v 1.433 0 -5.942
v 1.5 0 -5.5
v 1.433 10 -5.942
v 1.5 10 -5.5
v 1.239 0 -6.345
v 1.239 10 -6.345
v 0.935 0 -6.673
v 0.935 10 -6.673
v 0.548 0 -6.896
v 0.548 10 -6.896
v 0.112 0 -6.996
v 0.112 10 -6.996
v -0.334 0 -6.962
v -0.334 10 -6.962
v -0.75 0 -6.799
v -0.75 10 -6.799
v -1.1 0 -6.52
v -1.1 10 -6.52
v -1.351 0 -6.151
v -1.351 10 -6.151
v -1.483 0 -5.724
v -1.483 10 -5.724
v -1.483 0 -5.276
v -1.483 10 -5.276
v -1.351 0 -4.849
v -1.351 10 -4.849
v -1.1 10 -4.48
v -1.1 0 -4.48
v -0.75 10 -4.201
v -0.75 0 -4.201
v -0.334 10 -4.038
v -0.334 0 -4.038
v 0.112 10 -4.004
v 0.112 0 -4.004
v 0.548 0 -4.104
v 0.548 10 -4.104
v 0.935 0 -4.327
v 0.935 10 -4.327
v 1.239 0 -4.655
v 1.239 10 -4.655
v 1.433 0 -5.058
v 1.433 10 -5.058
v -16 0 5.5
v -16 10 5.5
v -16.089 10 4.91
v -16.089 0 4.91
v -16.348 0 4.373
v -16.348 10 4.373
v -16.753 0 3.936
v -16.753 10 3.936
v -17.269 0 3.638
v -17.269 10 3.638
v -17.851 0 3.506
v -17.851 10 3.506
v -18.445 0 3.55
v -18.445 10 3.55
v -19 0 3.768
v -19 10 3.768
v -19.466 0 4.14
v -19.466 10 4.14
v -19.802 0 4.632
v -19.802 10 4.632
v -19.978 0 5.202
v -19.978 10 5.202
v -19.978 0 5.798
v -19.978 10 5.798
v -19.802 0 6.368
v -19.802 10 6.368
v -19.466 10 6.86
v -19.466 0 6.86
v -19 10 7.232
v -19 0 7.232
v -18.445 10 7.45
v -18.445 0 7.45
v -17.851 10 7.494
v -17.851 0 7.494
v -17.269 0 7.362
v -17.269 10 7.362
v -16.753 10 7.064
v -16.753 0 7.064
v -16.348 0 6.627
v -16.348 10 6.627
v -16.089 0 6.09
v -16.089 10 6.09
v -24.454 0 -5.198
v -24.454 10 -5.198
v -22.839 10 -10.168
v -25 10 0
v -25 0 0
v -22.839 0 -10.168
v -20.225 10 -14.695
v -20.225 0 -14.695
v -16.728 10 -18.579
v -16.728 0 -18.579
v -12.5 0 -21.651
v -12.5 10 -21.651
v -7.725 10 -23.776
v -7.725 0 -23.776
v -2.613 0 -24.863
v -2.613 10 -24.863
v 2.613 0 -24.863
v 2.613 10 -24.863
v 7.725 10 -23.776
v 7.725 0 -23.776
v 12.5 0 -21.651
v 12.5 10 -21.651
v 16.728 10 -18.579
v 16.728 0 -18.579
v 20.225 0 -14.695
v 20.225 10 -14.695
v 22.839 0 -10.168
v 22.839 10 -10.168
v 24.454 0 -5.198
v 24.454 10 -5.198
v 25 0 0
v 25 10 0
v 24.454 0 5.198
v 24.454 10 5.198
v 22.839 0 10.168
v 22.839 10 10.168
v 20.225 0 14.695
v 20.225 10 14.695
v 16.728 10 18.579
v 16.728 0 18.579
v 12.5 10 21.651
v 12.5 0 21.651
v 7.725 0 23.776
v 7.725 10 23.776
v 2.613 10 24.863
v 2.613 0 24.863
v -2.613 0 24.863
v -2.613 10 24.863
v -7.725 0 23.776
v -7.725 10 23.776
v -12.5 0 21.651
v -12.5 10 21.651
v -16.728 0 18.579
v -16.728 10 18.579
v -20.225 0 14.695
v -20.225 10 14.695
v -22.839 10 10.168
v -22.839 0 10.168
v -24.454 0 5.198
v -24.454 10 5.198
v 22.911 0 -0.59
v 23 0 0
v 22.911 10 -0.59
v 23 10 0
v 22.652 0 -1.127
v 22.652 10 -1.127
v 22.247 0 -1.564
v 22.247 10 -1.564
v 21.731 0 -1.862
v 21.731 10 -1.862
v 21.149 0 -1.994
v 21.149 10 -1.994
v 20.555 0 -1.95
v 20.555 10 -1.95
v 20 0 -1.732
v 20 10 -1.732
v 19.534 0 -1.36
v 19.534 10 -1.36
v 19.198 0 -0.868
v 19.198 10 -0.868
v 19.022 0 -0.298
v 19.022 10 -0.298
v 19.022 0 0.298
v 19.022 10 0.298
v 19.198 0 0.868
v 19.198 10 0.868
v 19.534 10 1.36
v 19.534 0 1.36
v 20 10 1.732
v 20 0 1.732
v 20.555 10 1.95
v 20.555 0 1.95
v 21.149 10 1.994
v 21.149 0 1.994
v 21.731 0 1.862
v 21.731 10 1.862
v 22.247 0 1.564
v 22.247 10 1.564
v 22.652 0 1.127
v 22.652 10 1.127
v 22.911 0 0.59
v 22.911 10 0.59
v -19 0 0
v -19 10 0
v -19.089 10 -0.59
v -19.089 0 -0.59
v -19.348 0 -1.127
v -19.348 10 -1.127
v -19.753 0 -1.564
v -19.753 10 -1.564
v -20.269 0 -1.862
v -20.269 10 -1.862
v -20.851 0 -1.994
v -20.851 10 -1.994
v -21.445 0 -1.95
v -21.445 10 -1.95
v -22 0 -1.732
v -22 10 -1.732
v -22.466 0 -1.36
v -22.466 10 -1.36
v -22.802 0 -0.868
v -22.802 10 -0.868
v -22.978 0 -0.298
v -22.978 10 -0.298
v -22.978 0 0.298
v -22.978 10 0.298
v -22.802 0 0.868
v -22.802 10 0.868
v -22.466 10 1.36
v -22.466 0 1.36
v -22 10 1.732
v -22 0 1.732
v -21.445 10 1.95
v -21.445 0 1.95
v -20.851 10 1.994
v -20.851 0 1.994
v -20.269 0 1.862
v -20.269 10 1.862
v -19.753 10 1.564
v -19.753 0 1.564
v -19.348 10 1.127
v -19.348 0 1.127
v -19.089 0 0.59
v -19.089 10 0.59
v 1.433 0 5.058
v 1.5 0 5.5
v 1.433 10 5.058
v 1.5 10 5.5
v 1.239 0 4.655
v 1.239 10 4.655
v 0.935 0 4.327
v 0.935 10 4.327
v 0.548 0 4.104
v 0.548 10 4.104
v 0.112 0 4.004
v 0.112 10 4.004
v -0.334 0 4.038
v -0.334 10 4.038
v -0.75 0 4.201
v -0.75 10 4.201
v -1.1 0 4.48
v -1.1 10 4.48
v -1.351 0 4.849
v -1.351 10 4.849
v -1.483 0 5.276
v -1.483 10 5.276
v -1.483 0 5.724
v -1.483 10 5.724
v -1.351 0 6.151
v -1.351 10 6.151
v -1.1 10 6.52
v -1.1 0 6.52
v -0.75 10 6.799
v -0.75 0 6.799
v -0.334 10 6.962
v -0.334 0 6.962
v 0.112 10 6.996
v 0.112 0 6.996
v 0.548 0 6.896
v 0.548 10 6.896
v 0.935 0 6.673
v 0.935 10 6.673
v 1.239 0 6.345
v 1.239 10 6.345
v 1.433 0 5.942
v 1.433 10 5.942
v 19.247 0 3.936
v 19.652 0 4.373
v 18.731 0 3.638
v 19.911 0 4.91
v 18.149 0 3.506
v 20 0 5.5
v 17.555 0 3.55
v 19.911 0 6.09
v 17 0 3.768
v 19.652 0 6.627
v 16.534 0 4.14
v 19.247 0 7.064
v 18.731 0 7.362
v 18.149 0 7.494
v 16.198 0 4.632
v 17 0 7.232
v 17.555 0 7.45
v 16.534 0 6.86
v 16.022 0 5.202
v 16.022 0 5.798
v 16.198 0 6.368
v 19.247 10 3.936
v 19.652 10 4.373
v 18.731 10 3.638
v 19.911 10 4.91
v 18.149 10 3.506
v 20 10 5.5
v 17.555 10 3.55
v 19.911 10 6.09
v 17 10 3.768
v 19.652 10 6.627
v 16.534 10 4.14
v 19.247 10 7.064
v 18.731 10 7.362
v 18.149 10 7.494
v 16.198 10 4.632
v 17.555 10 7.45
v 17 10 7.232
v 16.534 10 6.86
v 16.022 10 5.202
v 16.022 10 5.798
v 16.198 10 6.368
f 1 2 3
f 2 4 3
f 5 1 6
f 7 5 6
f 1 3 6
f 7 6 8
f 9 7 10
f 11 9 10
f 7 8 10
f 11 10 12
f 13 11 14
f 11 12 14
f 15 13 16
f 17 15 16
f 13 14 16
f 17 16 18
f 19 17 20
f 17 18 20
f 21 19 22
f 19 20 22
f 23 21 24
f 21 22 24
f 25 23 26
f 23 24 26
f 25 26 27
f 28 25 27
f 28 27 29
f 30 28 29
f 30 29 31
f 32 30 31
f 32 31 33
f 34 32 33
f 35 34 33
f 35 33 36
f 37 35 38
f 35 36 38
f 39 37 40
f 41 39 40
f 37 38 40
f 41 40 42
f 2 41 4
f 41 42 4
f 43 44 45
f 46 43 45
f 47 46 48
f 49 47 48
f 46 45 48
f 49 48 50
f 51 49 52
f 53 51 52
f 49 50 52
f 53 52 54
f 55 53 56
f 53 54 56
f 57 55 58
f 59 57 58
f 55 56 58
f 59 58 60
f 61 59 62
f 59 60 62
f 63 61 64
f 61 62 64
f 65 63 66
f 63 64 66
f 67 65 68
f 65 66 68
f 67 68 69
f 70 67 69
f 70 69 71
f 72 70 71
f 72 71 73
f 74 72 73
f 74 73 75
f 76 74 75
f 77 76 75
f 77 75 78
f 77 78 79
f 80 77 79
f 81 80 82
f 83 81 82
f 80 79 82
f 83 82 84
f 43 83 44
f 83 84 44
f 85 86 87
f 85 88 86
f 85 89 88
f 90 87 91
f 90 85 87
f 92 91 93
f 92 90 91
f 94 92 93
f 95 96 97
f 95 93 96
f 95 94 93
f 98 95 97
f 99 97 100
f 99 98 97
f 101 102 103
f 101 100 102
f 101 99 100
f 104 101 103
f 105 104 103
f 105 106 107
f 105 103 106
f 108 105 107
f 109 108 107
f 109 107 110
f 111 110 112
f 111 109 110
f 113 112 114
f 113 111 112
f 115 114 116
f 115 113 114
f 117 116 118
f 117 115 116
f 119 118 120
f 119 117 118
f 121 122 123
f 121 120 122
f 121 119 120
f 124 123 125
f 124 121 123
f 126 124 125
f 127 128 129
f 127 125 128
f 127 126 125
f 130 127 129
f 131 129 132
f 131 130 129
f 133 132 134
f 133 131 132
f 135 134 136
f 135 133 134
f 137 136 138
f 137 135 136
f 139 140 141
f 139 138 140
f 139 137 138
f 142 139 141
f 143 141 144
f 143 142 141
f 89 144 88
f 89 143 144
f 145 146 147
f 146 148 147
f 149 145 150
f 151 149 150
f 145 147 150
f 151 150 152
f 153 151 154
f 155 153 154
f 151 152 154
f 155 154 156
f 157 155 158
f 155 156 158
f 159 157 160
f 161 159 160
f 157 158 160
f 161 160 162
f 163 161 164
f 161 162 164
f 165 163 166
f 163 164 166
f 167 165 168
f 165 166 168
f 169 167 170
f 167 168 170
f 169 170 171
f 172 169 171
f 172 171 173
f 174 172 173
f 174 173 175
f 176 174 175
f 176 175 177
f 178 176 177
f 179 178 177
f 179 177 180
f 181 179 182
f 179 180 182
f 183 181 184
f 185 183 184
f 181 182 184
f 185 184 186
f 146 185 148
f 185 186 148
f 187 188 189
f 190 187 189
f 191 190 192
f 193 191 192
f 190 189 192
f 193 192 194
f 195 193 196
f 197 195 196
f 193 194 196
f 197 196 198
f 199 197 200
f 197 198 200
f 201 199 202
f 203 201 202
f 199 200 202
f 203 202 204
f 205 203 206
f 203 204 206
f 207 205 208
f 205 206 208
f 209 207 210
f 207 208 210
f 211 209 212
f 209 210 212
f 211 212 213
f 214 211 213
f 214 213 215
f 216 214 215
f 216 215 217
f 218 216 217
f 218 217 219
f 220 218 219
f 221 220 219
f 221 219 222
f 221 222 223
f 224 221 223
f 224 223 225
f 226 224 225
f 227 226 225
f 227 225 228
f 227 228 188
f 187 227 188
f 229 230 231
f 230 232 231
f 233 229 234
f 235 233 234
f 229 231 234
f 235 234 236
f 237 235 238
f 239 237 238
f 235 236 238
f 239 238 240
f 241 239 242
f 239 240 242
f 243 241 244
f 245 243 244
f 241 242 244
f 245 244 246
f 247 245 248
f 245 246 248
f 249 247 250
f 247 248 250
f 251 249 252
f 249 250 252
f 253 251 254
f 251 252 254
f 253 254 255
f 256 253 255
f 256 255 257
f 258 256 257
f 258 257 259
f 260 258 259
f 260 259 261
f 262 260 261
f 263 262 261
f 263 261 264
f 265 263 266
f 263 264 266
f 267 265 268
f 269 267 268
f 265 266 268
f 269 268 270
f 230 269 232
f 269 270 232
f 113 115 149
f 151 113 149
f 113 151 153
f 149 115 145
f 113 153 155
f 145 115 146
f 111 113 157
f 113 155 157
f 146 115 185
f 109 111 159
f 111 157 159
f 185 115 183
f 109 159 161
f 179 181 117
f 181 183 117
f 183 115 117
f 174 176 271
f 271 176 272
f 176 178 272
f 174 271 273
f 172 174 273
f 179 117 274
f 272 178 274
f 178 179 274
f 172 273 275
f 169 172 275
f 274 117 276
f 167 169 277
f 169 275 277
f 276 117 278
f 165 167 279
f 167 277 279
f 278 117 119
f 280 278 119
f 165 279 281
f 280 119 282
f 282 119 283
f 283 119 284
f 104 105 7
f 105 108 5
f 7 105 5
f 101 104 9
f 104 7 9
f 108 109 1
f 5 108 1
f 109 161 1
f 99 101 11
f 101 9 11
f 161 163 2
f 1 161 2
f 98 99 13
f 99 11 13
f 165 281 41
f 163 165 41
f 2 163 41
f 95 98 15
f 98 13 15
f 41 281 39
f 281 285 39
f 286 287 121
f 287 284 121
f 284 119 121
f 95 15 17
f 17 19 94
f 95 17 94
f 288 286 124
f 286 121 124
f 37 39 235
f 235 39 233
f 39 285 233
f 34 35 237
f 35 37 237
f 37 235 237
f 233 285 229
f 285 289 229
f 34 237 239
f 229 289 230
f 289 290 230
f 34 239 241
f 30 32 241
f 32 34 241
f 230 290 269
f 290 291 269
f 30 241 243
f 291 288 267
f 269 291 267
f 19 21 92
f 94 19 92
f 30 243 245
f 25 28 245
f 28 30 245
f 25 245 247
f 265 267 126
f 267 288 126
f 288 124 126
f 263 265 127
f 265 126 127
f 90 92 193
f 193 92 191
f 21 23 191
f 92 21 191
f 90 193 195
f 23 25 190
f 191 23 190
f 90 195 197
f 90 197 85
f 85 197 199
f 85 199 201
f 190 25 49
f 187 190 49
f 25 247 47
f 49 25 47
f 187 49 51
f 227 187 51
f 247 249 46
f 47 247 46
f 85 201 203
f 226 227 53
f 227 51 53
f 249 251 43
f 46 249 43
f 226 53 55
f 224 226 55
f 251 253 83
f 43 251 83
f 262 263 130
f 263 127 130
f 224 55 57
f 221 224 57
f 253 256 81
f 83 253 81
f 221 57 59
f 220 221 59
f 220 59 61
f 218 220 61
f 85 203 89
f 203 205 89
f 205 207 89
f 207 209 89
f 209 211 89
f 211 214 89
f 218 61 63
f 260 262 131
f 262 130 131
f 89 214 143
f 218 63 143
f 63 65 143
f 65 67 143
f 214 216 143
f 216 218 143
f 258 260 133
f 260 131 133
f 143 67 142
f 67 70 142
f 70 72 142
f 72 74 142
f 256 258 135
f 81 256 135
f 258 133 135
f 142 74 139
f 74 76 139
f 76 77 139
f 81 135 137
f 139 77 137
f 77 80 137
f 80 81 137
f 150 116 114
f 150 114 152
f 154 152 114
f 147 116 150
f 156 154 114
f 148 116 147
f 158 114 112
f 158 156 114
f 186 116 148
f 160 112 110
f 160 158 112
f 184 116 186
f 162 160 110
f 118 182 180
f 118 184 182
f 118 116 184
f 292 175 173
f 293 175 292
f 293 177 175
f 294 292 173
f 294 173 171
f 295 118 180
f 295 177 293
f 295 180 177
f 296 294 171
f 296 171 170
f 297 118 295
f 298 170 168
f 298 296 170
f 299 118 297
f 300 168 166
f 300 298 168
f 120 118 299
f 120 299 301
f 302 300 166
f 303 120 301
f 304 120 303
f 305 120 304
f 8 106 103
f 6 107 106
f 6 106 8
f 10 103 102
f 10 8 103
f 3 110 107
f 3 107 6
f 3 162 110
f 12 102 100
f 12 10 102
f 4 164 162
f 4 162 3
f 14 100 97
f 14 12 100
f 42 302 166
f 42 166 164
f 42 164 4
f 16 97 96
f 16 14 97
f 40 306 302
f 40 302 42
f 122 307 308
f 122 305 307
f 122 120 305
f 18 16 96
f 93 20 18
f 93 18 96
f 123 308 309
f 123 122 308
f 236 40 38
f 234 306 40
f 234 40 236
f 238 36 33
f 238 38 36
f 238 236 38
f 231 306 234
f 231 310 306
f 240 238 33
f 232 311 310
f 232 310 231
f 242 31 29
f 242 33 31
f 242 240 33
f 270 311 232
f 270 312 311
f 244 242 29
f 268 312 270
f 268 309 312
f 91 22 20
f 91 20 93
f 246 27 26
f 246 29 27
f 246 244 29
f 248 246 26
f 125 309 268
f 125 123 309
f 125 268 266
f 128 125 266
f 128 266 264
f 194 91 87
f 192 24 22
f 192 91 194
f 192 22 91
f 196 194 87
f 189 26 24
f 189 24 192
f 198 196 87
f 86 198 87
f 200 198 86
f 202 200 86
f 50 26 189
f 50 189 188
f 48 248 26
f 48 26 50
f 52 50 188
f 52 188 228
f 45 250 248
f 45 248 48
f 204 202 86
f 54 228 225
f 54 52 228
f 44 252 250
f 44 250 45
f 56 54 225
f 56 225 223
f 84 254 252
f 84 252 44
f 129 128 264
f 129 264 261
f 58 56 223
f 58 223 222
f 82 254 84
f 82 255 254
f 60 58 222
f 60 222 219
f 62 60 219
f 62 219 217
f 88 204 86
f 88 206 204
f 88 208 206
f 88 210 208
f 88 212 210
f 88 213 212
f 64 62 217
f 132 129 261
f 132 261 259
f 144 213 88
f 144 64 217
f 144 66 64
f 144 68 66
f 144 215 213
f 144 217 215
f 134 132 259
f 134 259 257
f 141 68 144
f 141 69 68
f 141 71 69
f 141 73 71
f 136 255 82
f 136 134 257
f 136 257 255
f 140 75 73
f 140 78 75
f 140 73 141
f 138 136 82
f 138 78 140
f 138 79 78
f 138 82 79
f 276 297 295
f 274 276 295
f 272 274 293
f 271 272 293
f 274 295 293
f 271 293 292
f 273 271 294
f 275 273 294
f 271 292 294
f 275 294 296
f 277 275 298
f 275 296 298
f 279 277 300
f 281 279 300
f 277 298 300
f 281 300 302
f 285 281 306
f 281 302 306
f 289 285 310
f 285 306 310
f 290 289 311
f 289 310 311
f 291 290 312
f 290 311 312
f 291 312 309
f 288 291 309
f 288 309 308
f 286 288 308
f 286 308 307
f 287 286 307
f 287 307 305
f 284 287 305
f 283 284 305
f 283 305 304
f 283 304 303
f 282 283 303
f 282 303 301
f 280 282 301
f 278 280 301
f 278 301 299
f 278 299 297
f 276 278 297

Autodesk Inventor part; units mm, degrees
ref_plane "YZ Plane" through (0, 0, 0) normal (1, 0, 0) x (0, 1, 0)
ref_plane "XZ Plane" through (0, 0, 0) normal (0, 1, 0) x (-1, 0, 0)
ref_plane "XY Plane" through (0, 0, 0) normal (0, 0, 1) x (1, 0, 0)
sketch "Sketch1" plane through (0, 0, 0) normal (0, 1, 0) x (-1, 0, 0)
  circle A0 centre (0, 0) radius 25
  dimension "d0" = 50
extrude "Extrusion1" add sketch "Sketch1" along normal blind 10
sketch "Sketch2" plane through (0, 10, 0) normal (0, 1, 0) x (1, 0, 0)
  circle A0 centre (0, -5.5) radius 1.5
  circle A1 centre (0, 5.5) radius 1.5
  circle A2 centre (-18, -5.5) radius 2
  circle A3 centre (-21, 0) radius 2
  circle A4 centre (21, 0) radius 2
  circle A5 centre (18, -5.5) radius 2
  point P0 (0, 0)
  dimension "d3" = 3
  dimension "d4" = 3
  dimension "d5" = 5.5
  dimension "d6" = 5.5
  dimension "d7" = 4
  dimension "d8" = 4
  dimension "d9" = 4
  dimension "d10" = 4
  dimension "d11" = 21
  dimension "d12" = 21
  dimension "d13" = 18
  dimension "d14" = 18
extrude "Extrusion2" cut sketch "Sketch2" against normal blind 10
properties part number "cABEZOTE"
